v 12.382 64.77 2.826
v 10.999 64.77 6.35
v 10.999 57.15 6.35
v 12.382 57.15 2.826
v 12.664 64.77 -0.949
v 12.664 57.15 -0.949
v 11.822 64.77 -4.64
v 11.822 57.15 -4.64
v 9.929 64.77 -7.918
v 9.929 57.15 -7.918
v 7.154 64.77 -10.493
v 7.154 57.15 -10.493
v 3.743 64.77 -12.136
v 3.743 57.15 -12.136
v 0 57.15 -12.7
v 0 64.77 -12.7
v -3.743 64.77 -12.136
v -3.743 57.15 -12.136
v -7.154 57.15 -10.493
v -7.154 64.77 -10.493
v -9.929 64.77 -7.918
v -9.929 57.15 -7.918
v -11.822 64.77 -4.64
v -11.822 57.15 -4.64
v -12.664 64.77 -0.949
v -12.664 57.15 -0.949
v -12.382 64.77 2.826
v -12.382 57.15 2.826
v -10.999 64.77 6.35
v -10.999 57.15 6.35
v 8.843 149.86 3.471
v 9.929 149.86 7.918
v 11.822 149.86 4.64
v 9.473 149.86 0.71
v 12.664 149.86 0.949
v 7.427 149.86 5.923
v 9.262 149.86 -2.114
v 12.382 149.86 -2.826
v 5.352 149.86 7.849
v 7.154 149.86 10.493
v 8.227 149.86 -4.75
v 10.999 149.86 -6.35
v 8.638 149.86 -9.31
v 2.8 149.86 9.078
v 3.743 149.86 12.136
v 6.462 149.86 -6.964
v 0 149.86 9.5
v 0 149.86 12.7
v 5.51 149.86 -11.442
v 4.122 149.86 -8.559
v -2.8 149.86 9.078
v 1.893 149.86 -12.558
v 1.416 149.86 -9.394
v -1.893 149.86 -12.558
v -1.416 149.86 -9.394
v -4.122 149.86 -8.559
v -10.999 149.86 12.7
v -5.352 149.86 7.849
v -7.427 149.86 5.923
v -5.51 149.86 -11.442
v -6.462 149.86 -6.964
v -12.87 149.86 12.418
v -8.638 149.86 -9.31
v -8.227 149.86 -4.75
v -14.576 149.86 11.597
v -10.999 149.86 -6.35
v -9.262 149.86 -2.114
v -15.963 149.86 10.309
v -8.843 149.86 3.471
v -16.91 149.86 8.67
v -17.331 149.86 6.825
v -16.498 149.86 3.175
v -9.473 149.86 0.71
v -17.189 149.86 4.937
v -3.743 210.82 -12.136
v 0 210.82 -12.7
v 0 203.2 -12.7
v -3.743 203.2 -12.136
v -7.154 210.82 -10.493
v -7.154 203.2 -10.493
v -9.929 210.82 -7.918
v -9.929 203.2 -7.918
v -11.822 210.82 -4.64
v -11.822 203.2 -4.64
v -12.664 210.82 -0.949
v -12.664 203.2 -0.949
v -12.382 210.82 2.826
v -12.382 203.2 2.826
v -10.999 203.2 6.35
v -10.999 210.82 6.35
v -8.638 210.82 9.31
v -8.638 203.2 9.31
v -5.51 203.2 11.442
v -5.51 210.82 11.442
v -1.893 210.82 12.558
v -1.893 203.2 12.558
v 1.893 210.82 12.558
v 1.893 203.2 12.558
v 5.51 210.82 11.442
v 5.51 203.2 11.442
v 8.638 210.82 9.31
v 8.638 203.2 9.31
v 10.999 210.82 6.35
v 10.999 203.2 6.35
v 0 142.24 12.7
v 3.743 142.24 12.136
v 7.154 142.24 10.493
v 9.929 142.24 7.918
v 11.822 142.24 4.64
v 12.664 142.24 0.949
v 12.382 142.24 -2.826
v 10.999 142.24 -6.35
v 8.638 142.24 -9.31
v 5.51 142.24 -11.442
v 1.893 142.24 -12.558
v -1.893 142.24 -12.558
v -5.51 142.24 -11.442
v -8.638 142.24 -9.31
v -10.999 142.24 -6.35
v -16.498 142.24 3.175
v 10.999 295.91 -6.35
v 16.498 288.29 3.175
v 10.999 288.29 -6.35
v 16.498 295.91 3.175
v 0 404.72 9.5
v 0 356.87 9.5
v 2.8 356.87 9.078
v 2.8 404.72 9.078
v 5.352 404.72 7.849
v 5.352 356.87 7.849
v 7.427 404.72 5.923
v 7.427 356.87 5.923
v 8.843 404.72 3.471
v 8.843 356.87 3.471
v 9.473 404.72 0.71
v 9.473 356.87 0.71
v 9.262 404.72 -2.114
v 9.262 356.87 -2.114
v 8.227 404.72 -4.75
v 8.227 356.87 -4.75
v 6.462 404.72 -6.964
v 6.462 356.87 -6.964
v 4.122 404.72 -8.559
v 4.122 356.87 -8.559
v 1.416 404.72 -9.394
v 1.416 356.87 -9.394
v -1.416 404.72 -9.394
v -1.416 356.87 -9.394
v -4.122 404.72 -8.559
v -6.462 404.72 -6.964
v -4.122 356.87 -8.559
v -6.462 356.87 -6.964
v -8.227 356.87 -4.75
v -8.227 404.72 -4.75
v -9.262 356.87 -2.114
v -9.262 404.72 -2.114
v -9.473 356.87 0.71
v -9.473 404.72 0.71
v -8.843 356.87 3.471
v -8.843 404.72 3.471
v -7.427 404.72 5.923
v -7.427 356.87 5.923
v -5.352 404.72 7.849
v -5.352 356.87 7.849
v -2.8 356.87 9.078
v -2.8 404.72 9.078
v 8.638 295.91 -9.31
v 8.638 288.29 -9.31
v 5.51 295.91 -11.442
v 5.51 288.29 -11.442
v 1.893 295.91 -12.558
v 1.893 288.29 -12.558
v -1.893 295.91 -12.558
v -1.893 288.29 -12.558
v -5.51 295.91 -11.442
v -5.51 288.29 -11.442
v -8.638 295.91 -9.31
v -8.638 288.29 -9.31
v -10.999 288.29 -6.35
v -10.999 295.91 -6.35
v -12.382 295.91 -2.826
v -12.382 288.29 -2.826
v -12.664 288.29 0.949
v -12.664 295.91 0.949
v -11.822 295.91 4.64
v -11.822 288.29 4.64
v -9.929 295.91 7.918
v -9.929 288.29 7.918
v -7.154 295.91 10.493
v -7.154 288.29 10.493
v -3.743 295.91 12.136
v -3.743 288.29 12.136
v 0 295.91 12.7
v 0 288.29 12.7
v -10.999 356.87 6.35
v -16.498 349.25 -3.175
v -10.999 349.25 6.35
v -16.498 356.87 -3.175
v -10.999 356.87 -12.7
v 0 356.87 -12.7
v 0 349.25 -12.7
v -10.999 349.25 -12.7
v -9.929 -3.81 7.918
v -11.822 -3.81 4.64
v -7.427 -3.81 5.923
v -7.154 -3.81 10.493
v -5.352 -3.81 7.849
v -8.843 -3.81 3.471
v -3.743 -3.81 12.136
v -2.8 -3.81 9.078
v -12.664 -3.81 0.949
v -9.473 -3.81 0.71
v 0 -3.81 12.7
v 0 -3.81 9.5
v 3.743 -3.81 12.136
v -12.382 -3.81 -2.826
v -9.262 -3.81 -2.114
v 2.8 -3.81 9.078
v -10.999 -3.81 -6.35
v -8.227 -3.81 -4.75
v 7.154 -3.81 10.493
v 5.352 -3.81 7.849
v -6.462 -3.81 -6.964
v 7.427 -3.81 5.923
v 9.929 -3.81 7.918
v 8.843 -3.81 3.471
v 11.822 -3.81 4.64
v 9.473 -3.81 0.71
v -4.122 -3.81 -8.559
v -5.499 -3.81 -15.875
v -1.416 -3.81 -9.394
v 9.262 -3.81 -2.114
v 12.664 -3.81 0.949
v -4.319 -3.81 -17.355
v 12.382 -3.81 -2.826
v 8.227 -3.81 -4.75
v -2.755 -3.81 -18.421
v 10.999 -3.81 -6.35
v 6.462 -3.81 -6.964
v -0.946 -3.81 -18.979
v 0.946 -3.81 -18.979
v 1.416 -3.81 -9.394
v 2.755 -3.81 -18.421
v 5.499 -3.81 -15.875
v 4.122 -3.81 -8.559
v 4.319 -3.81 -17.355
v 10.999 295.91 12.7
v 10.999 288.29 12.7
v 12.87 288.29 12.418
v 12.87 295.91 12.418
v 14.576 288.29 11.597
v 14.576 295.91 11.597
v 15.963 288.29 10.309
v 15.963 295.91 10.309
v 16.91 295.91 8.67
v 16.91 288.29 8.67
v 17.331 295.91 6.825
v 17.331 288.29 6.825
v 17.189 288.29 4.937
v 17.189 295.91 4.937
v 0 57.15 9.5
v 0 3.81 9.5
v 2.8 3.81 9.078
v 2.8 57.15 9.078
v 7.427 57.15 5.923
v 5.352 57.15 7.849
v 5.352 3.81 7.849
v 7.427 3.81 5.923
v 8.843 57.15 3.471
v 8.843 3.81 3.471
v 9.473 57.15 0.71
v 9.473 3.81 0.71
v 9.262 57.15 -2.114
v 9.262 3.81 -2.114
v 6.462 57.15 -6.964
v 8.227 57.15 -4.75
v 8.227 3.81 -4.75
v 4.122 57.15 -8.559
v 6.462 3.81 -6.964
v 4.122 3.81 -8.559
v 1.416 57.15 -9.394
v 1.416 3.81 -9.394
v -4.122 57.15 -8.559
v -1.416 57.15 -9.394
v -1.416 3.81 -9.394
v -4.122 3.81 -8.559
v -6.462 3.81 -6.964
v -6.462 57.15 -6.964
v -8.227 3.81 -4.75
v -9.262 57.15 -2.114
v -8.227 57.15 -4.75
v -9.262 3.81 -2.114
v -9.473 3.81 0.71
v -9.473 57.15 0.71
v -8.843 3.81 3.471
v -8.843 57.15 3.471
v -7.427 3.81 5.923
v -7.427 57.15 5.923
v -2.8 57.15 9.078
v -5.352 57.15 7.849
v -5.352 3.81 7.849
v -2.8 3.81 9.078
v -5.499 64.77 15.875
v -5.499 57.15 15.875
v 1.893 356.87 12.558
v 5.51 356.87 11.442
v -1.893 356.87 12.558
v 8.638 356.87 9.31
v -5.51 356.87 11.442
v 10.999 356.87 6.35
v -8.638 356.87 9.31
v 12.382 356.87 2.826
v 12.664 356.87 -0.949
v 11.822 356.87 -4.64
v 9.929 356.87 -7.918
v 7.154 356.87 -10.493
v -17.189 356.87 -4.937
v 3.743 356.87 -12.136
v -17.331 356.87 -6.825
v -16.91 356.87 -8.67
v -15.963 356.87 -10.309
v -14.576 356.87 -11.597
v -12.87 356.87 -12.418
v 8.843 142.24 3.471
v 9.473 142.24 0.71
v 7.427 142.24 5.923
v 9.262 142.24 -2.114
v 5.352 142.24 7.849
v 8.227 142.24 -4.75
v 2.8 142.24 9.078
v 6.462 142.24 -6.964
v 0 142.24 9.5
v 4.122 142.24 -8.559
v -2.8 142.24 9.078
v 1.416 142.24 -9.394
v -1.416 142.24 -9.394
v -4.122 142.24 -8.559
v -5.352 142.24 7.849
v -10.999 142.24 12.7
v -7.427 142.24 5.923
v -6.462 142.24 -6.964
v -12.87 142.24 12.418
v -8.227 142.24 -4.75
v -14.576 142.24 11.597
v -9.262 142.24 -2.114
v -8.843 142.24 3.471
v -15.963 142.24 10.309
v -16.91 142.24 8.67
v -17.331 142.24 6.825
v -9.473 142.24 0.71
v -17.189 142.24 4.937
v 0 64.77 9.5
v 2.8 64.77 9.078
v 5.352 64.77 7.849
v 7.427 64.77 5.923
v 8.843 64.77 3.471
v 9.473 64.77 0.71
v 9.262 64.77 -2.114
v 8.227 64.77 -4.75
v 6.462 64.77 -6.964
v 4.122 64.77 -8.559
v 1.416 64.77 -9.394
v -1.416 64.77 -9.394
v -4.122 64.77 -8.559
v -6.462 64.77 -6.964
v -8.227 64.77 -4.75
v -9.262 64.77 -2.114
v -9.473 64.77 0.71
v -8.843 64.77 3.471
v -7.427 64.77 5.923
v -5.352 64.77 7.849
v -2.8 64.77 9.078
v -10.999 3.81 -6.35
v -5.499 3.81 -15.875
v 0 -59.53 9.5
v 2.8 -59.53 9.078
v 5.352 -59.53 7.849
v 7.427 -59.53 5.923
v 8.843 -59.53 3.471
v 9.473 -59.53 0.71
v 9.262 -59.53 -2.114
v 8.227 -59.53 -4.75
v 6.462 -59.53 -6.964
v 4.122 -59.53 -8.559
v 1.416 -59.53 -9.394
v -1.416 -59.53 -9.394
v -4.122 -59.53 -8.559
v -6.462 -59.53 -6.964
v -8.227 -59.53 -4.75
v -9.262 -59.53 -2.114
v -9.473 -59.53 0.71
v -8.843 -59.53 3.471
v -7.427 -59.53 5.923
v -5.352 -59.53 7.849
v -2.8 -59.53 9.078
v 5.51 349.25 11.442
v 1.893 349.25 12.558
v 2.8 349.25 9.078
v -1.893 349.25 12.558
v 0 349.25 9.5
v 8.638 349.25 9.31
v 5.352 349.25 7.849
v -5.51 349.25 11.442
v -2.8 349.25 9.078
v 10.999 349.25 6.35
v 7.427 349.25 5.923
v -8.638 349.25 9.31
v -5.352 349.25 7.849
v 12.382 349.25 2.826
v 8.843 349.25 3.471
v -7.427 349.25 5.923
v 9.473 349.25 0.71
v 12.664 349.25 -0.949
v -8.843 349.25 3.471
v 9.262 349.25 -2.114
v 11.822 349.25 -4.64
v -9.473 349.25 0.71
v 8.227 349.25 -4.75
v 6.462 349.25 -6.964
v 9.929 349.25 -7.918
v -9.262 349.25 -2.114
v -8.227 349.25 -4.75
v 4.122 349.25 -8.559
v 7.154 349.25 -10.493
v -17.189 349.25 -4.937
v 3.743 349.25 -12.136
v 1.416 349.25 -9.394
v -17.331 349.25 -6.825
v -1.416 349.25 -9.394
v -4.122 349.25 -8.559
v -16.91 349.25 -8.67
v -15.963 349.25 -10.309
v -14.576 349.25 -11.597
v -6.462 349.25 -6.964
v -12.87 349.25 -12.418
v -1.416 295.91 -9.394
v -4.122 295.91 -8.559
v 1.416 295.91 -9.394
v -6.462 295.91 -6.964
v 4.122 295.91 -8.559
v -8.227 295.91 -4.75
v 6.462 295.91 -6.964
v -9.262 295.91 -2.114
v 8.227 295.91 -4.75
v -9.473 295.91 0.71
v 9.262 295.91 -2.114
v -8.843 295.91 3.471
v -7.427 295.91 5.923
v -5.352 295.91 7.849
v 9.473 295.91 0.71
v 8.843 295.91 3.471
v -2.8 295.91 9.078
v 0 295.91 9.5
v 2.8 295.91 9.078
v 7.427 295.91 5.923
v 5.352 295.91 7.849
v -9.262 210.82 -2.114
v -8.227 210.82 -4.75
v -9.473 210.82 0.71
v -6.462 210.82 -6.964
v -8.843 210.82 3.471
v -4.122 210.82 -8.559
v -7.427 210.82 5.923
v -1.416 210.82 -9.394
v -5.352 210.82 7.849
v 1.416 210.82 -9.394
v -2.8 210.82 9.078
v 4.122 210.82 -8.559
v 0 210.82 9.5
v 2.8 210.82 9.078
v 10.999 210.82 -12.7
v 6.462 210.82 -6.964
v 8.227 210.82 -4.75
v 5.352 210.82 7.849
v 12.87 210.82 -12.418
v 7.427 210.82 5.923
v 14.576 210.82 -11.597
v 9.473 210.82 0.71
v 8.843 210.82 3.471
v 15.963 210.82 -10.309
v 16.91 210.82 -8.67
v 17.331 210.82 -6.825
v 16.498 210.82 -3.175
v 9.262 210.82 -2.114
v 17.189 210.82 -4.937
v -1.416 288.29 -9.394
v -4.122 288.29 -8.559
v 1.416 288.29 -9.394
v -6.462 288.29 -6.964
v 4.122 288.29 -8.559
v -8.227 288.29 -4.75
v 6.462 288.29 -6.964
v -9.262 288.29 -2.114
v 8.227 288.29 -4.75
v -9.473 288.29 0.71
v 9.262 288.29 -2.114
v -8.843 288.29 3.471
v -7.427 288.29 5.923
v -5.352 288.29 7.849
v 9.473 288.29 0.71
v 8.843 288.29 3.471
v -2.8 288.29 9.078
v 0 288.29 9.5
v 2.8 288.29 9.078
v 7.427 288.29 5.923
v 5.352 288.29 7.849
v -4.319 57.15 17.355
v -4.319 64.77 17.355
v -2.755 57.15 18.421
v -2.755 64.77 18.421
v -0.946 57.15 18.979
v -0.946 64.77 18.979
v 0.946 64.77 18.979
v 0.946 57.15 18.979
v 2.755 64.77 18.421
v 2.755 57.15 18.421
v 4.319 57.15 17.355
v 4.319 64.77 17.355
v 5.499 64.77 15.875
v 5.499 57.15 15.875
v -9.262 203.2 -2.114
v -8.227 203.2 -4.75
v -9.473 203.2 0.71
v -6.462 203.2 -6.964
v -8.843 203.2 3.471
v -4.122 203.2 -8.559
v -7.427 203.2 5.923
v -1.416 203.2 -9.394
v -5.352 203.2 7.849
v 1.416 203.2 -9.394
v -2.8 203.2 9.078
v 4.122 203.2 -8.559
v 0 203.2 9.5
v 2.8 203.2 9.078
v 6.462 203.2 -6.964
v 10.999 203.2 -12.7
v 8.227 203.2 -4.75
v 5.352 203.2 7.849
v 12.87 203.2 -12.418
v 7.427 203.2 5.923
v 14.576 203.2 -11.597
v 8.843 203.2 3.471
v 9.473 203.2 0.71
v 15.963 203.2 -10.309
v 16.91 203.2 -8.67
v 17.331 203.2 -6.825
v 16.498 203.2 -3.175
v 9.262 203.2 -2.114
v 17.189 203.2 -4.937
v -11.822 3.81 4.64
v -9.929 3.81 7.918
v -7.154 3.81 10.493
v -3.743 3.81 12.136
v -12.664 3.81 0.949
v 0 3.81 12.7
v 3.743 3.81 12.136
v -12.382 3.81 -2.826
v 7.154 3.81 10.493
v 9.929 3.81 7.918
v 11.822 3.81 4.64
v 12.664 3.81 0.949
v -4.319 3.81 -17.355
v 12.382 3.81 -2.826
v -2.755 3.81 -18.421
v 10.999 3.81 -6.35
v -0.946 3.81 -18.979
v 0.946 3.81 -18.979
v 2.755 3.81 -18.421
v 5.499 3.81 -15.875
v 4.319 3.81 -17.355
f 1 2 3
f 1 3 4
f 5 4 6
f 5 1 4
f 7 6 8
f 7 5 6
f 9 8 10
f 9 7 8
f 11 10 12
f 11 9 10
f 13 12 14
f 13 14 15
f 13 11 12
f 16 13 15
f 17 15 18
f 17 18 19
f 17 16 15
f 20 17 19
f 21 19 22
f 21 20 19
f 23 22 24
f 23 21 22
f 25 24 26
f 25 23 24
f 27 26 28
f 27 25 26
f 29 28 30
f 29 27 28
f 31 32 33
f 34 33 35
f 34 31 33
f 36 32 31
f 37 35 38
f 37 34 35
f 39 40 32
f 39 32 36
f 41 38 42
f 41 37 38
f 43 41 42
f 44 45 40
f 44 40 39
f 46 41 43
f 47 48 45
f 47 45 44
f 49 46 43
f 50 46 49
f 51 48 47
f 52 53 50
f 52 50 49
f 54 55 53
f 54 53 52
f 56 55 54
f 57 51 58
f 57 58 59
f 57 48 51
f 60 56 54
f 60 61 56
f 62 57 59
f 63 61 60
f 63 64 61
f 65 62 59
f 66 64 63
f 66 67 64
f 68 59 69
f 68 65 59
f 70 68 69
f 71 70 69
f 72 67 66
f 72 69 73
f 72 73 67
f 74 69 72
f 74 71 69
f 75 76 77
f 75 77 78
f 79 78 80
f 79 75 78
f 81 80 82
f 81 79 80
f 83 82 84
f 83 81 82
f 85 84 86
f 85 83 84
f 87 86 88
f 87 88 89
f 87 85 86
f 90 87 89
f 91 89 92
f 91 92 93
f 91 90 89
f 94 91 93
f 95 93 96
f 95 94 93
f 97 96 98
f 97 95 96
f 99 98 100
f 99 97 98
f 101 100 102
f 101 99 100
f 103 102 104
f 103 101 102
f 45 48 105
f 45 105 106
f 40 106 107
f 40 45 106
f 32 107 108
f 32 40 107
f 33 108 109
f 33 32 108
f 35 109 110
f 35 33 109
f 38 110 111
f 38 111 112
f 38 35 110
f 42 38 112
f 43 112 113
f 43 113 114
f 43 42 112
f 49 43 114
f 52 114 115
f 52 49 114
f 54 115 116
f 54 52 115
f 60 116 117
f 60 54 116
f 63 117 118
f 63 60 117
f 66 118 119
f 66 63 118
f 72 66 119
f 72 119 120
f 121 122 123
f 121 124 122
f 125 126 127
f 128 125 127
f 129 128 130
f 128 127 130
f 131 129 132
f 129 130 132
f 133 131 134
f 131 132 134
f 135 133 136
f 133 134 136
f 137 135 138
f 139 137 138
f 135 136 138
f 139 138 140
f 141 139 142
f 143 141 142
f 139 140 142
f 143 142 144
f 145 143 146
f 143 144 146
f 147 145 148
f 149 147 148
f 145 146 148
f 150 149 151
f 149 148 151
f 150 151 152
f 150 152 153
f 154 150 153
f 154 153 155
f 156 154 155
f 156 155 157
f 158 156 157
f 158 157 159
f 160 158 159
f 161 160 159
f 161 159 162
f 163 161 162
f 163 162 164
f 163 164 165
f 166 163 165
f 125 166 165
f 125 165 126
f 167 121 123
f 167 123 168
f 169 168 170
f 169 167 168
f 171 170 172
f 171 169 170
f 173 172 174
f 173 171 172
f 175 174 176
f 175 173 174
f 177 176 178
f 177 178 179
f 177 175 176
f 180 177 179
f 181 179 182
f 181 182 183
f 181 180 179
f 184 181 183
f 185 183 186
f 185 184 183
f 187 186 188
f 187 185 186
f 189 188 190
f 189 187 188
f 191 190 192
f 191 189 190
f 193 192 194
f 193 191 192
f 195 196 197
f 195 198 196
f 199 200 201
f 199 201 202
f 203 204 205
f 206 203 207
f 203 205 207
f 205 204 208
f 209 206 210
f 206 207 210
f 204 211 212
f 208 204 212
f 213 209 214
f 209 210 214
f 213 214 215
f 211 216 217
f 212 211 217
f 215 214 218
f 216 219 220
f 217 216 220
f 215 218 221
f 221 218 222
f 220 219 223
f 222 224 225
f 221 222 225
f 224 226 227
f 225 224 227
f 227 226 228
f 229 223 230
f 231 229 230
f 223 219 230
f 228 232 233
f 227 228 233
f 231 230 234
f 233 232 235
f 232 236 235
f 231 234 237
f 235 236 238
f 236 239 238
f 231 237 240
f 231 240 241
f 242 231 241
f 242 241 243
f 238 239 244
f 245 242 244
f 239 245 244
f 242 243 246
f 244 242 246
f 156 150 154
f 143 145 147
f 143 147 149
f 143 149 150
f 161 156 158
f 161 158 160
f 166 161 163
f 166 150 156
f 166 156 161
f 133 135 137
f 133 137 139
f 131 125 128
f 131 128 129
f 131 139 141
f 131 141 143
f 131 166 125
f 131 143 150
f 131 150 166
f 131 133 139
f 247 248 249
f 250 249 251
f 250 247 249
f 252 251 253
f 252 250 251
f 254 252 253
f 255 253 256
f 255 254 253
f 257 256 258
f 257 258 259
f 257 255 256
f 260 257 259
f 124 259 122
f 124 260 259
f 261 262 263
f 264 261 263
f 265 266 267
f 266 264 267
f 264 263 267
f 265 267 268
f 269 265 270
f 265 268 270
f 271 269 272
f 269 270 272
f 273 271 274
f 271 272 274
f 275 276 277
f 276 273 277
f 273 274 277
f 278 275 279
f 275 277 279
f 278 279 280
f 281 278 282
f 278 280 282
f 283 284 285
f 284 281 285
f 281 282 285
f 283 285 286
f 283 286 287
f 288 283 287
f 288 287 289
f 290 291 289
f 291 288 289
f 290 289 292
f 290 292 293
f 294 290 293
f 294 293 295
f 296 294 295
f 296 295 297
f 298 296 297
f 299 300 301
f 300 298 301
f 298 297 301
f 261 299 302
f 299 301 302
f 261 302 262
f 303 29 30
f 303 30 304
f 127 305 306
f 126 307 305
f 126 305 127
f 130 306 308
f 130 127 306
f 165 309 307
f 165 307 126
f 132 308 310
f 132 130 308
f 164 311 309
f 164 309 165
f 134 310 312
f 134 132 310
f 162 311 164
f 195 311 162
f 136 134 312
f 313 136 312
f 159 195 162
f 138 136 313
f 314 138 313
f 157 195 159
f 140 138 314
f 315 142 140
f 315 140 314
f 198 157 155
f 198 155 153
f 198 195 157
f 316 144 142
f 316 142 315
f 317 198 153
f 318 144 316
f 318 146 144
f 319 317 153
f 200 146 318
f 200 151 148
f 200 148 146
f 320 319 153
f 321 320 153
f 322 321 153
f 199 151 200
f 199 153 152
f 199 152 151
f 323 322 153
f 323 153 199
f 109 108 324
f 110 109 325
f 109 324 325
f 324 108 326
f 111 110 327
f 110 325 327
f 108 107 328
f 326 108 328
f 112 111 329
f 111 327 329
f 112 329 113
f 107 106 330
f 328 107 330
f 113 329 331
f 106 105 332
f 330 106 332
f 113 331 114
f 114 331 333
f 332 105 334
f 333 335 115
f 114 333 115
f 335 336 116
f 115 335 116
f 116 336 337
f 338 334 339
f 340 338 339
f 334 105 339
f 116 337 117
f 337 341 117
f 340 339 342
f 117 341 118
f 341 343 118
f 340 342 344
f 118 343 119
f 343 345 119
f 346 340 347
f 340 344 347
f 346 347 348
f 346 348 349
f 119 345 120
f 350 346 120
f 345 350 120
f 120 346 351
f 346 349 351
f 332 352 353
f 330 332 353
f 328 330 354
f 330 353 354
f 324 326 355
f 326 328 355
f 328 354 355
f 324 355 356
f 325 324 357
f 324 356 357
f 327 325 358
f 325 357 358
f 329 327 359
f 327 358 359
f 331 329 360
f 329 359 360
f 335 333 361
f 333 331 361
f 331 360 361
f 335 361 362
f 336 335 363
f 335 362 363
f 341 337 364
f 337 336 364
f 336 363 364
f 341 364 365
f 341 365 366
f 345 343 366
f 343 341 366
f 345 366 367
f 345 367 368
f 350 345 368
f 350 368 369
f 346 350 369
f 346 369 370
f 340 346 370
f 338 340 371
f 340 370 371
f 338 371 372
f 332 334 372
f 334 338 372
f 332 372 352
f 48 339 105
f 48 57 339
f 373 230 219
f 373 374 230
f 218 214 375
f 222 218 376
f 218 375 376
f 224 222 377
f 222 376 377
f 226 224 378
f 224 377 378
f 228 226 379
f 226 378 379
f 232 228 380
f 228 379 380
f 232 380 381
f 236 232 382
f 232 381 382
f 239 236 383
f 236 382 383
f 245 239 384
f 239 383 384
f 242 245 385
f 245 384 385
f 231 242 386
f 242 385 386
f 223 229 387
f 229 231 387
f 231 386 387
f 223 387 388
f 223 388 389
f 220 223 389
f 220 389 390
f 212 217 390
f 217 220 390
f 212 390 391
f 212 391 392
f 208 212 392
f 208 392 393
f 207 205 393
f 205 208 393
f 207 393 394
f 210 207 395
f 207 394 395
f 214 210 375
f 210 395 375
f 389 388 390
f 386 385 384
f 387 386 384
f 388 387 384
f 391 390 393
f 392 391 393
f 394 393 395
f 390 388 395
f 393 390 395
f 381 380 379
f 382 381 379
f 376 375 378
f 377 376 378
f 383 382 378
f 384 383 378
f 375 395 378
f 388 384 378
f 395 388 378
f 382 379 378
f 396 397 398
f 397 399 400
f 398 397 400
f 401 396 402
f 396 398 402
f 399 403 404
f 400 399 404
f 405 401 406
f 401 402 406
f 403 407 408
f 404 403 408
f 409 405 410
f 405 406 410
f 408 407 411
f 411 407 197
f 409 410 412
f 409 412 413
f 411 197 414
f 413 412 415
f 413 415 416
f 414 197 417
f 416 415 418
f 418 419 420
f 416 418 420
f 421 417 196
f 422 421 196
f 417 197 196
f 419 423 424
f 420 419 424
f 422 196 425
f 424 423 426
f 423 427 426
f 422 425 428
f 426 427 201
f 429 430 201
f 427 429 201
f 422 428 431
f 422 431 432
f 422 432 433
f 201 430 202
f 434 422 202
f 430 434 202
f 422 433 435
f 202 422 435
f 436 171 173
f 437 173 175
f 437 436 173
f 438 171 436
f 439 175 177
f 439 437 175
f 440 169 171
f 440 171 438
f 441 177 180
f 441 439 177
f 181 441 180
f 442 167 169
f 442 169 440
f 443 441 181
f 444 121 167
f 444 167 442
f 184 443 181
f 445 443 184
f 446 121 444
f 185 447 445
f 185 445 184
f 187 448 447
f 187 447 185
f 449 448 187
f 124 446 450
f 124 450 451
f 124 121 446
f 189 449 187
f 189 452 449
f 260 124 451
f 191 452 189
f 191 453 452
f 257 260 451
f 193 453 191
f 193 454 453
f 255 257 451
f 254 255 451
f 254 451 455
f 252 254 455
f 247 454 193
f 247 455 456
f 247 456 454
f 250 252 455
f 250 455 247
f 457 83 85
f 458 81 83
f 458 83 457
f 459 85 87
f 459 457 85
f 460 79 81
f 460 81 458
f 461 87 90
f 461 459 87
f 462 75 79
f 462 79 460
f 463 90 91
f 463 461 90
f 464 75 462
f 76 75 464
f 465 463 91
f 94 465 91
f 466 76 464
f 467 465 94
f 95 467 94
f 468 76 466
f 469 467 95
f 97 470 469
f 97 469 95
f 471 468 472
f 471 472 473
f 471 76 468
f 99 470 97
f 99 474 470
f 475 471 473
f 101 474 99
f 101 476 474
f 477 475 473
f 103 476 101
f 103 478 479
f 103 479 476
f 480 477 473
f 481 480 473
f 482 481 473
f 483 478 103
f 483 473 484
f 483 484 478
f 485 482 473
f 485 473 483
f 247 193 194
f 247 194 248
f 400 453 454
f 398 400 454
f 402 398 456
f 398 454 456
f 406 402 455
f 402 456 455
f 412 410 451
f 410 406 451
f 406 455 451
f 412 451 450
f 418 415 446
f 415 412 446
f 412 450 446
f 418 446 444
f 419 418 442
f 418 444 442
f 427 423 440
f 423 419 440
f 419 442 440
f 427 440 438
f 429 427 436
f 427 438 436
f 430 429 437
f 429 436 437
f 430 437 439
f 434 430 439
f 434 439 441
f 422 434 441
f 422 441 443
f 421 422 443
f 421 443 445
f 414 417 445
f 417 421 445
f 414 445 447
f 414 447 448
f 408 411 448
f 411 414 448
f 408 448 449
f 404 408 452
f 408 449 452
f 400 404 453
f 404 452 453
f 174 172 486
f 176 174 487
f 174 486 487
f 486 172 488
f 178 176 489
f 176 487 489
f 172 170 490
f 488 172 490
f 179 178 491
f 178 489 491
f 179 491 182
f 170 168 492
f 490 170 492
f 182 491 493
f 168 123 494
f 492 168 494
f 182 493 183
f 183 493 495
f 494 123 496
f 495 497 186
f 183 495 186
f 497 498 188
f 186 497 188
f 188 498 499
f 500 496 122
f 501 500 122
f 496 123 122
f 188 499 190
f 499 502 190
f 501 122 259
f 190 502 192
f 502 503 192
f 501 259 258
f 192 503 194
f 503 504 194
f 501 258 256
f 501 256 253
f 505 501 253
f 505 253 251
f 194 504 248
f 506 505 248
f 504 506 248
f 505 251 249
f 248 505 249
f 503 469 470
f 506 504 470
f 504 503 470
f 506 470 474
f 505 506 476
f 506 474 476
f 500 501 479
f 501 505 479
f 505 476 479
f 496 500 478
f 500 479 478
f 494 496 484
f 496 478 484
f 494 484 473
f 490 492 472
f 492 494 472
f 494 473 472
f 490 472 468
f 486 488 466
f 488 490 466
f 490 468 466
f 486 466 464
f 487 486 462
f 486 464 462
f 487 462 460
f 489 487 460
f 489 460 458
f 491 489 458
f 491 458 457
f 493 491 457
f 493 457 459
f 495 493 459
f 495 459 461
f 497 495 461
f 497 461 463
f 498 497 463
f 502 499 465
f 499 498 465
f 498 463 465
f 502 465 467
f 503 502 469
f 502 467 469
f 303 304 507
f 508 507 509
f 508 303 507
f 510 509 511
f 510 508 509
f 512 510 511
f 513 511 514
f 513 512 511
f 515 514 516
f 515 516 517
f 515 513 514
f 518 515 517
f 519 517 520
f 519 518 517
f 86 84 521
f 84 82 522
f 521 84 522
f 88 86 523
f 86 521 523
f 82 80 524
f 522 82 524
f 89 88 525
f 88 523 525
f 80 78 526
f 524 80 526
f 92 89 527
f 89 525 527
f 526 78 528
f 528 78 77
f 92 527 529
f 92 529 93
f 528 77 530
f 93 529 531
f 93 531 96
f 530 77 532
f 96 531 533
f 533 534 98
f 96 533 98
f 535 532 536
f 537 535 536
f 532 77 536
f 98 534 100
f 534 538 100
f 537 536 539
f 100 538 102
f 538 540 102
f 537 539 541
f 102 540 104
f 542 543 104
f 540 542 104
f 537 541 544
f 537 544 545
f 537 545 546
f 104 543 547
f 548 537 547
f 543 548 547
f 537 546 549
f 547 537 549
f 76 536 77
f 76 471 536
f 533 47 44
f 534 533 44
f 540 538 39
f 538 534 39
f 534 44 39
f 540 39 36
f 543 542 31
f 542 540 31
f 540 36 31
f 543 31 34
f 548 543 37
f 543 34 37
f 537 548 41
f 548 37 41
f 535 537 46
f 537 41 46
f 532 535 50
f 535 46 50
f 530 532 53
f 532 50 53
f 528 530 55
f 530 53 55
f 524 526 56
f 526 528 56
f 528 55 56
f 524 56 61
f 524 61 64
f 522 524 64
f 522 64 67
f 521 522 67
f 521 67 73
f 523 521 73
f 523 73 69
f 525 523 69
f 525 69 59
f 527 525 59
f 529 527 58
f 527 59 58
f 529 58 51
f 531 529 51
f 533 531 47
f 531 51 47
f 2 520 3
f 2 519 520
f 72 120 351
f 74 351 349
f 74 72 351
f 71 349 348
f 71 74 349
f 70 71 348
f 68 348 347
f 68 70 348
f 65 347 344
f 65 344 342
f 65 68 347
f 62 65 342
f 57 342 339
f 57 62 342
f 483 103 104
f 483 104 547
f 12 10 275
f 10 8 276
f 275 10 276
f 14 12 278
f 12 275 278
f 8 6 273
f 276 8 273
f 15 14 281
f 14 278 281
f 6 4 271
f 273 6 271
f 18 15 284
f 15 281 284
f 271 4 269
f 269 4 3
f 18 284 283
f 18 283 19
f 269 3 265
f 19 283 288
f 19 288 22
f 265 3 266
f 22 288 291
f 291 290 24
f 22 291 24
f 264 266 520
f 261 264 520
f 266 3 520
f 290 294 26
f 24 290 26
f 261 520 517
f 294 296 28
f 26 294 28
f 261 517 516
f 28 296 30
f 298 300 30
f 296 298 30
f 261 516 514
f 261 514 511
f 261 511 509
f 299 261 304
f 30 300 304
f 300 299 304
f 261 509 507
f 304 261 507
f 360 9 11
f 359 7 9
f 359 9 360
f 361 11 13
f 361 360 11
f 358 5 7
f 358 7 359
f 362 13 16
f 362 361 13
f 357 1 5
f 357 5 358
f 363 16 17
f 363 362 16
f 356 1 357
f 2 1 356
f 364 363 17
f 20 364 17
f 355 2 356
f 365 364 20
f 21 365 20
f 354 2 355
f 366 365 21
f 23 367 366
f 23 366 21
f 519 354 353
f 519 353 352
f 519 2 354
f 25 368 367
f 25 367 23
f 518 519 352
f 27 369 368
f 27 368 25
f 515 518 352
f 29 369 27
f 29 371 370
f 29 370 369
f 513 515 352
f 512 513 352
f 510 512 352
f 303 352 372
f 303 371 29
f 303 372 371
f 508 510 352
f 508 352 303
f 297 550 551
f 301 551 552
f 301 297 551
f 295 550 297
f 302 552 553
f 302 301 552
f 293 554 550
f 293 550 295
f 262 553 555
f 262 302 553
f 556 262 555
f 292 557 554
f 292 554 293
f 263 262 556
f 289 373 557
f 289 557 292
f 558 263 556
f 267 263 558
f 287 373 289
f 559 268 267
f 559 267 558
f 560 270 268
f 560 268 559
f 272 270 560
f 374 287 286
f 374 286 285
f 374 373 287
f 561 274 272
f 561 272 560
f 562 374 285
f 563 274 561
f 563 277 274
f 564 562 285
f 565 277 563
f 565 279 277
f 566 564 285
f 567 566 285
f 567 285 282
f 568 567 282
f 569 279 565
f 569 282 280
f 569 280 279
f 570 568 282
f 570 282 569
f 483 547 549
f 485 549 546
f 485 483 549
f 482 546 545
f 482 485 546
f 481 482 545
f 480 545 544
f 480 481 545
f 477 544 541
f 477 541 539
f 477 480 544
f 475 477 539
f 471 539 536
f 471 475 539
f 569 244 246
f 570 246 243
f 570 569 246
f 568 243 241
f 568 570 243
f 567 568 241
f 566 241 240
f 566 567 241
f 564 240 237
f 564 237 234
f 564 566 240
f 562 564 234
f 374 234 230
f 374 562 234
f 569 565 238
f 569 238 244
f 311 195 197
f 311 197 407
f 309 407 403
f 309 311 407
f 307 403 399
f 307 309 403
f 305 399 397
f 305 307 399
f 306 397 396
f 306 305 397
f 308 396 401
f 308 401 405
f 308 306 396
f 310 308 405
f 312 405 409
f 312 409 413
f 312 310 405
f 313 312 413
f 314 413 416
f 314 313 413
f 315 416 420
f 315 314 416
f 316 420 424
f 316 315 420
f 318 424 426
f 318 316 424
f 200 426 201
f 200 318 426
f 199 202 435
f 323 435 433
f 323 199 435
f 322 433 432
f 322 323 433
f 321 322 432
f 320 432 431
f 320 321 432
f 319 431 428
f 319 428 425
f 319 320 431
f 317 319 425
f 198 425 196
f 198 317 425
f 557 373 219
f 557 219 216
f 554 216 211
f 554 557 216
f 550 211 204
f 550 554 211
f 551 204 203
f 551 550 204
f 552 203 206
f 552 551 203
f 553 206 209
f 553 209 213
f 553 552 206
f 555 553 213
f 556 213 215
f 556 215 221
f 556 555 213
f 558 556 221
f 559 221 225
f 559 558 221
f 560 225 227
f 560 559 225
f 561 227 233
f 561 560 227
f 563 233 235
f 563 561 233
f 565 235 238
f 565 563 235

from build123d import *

# Parameters (mm, degrees)
BOSS_EXTRUDE1_DEPTH   = 3.81
LPATTERN1_COUNT       = 2
LPATTERN1_PITCH       = 60.96
BODY_MOVE_COPY1_ANGLE = 180
LPATTERN2_COUNT       = 3
LPATTERN2_PITCH       = 146.05
BODY_MOVE_COPY2_ANGLE = 120
BODY_MOVE_COPY3_ANGLE = 120
BOSS_EXTRUDE2_START   = -59.53
SKETCH5_R             = 9.5
BOSS_EXTRUDE2_DEPTH   = 464.25


with BuildPart() as part:
    # Sketch2 → Boss-Extrude1 (new, symmetric)
    with BuildSketch(Plane(origin=(0, 0, 0), x_dir=(1, 0, 0), z_dir=(0, 1, 0))):
        with BuildLine():
            Line((-5.499261314, 15.875), (-10.998522628, 6.35))
            ThreePointArc((-10.998522628, 6.35), (0, -12.7), (10.998522628, 6.35))
            Line((10.998522628, 6.35), (5.499261314, 15.875))
            ThreePointArc((5.499261314, 15.875), (0, 19.05), (-5.499261314, 15.875))
        make_face()
    extrude(amount=BOSS_EXTRUDE1_DEPTH, both=True)


with BuildPart() as lpattern1_1:
    # LPattern1: pattern copy
    add(part.part.moved(Location(Vector(0, 1, 0) * (1 * LPATTERN1_PITCH))))


with BuildPart() as lpattern1_1_1:
    # Body-Move/Copy1: moved
    add(lpattern1_1.part.rotate(Axis((0, 0, 0), (0, 1, 0)), BODY_MOVE_COPY1_ANGLE))


with BuildPart() as lpattern2_1:
    # LPattern2: pattern copy
    add(part.part.moved(Location(Vector(0, 1, 0) * (1 * LPATTERN2_PITCH))))


with BuildPart() as lpattern2_2:
    # LPattern2: pattern copy
    add(part.part.moved(Location(Vector(0, 1, 0) * (2 * LPATTERN2_PITCH))))


with BuildPart() as lpattern2_3:
    # LPattern2: pattern copy
    add(lpattern1_1_1.part.moved(Location(Vector(0, 1, 0) * (1 * LPATTERN2_PITCH))))


with BuildPart() as lpattern2_4:
    # LPattern2: pattern copy
    add(lpattern1_1_1.part.moved(Location(Vector(0, 1, 0) * (2 * LPATTERN2_PITCH))))


with BuildPart() as lpattern2_1_1:
    # Body-Move/Copy2: moved
    add(lpattern2_1.part.rotate(Axis((0, 0, 0), (0, 1, 0)), BODY_MOVE_COPY2_ANGLE))


with BuildPart() as lpattern2_3_1:
    # Body-Move/Copy2: moved
    add(lpattern2_3.part.rotate(Axis((0, 0, 0), (0, 1, 0)), BODY_MOVE_COPY2_ANGLE))


with BuildPart() as lpattern2_4_1:
    # Body-Move/Copy3: moved
    add(lpattern2_4.part.rotate(Axis((0, 0, 0), (0, -1, 0)), BODY_MOVE_COPY3_ANGLE))


with BuildPart() as lpattern2_2_1:
    # Body-Move/Copy3: moved
    add(lpattern2_2.part.rotate(Axis((0, 0, 0), (0, -1, 0)), BODY_MOVE_COPY3_ANGLE))


with BuildPart() as part_1:
    add(part.part)

    add(lpattern1_1_1.part)  # Boss-Extrude2 merges LPattern1_1

    add(lpattern2_1_1.part)  # Boss-Extrude2 merges LPattern2_1

    add(lpattern2_2_1.part)  # Boss-Extrude2 merges LPattern2_2

    add(lpattern2_3_1.part)  # Boss-Extrude2 merges LPattern2_3

    add(lpattern2_4_1.part)  # Boss-Extrude2 merges LPattern2_4
    # Sketch5 → Boss-Extrude2 (add)
    with BuildSketch(Plane(origin=(0, 0, 0), x_dir=(1, 0, 0), z_dir=(0, 1, 0)).offset(BOSS_EXTRUDE2_START)):
        Circle(SKETCH5_R)
    extrude(amount=BOSS_EXTRUDE2_DEPTH)


solid = part_1.part
